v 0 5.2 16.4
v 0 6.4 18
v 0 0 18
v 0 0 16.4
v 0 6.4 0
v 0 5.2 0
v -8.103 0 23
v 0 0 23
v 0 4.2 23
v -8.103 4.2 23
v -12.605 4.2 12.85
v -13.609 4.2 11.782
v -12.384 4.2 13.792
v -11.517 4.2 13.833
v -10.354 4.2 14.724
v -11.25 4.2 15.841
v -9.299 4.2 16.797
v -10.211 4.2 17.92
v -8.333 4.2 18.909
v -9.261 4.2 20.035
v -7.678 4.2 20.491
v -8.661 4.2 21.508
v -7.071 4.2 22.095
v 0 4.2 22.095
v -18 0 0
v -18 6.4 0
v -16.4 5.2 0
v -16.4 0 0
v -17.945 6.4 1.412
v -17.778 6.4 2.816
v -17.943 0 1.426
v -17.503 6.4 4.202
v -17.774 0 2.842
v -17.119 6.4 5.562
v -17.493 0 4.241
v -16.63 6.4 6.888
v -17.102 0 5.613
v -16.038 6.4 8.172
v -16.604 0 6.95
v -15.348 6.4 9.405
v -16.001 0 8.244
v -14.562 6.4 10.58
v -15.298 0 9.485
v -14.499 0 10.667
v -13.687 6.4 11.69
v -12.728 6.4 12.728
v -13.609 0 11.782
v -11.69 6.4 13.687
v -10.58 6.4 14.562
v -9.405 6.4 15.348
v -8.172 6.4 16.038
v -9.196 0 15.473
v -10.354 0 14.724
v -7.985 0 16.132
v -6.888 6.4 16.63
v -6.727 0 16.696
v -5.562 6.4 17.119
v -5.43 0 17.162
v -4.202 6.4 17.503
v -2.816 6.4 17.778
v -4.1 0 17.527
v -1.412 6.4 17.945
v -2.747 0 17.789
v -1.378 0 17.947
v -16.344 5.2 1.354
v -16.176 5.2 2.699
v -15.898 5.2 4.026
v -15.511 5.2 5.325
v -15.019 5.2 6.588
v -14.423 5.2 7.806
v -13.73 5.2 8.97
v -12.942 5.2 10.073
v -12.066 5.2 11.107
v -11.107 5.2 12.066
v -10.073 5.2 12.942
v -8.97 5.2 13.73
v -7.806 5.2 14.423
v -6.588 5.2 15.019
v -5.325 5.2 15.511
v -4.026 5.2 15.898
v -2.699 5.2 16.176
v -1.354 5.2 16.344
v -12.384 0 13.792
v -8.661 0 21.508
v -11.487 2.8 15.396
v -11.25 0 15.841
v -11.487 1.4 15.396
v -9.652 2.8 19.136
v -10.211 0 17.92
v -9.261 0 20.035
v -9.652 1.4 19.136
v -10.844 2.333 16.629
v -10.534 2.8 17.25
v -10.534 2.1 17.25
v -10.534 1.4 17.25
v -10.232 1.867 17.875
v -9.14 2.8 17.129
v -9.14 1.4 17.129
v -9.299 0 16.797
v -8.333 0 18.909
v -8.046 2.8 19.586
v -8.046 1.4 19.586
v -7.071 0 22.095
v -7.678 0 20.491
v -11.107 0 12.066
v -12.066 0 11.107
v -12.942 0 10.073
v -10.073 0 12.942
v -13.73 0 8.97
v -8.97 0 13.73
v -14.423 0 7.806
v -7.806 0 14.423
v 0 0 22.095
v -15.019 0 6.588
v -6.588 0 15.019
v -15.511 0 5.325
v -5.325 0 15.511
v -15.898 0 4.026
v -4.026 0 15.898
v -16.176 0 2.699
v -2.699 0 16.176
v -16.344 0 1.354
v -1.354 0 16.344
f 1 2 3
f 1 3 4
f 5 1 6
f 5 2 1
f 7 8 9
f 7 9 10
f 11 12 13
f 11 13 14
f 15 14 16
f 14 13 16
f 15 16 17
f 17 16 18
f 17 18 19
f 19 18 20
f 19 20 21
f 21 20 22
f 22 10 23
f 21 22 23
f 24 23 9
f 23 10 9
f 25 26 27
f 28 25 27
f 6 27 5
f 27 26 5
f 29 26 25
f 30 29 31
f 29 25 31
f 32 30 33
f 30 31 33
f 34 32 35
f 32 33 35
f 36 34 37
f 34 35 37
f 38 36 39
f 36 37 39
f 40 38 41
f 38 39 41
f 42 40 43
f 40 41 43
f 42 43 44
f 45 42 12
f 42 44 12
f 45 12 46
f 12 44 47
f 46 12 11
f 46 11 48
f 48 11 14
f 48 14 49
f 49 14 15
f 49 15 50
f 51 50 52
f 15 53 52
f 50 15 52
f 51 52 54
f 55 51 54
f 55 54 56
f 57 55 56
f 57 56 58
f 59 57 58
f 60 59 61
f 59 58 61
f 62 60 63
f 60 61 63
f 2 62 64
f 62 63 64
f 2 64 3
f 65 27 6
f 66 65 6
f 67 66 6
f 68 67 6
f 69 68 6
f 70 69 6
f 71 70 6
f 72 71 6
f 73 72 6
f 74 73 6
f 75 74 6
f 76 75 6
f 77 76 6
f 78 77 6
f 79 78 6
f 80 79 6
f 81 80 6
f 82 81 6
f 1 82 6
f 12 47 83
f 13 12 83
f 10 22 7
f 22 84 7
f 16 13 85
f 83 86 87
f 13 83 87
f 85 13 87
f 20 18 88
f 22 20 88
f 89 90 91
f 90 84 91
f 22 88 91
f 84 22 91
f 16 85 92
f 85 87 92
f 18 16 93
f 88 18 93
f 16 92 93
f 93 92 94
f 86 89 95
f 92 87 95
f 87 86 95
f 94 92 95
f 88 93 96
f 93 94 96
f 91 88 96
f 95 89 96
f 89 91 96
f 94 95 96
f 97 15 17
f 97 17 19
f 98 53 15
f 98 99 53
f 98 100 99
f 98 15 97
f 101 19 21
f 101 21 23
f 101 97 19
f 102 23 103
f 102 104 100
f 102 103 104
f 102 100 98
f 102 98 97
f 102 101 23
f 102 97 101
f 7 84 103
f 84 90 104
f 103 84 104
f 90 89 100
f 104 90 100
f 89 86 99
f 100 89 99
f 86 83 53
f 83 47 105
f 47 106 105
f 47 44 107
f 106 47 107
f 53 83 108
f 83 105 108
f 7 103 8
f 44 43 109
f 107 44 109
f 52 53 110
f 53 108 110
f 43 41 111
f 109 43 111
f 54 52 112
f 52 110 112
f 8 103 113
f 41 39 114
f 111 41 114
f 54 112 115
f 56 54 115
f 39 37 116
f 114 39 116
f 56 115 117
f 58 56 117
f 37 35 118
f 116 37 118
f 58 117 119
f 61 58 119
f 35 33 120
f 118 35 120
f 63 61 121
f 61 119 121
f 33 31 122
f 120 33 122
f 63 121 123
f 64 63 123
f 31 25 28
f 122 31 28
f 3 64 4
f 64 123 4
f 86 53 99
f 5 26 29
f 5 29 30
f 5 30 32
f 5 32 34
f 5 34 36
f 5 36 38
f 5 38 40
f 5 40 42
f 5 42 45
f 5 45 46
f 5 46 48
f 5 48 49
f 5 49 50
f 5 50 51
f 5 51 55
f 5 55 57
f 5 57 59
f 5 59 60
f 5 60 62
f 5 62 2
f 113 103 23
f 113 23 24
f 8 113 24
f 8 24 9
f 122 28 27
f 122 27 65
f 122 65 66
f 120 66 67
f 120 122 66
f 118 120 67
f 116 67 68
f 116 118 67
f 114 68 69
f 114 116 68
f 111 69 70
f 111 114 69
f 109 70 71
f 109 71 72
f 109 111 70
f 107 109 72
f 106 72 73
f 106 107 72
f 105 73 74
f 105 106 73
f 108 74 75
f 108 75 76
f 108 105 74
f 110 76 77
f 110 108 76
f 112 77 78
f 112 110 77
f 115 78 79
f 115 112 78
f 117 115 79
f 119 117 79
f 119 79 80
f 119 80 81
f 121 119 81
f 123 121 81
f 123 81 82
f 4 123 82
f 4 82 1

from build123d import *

# Parameters (mm, degrees)
SKETCH1_R           = 18
SKETCH1_R_2         = 16.4
BOSS_EXTRUDE1_DEPTH = 6.4
SKETCH2_R           = 16.4
BOSS_EXTRUDE2_DEPTH = 1.2
SKETCH3_W           = 28.944907734
SKETCH3_H           = 19.372936664
SKETCH3_W_2         = 25.830582219
CUT_EXTRUDE1_DEPTH  = 9.2
SKETCH4_W           = 21.729498485
SKETCH4_H           = 20.961841185
CUT_EXTRUDE2_DEPTH  = 9.2
BOSS_EXTRUDE3_DEPTH = 4.2


with BuildPart() as part:
    # Sketch1 → Boss-Extrude1 (new body)
    with BuildSketch(Plane(origin=(0, 0, 0), x_dir=(1, 0, 0), z_dir=(0, 1, 0))):
        Circle(SKETCH1_R)
        Circle(SKETCH1_R_2, mode=Mode.SUBTRACT)
    extrude(amount=BOSS_EXTRUDE1_DEPTH)

    # Sketch2 → Boss-Extrude2 (add)
    with BuildSketch(Plane(origin=(0, 6.4, 0), x_dir=(1, 0, 0), z_dir=(0, 1, 0))):
        Circle(SKETCH2_R)
    extrude(amount=-BOSS_EXTRUDE2_DEPTH)

    # Sketch3 → Cut-Extrude1 (cut)
    with BuildSketch(Plane(origin=(0, 6.4, 0), x_dir=(1, 0, 0), z_dir=(0, 1, 0))):
        with Locations((-14.472453867, 9.686468332)):
            Rectangle(SKETCH3_W, SKETCH3_H)
        with Locations((12.91529111, 9.686468332)):
            Rectangle(SKETCH3_W_2, SKETCH3_H)
    extrude(amount=-CUT_EXTRUDE1_DEPTH, mode=Mode.SUBTRACT)

    # Sketch4 → Cut-Extrude2 (cut)
    with BuildSketch(Plane(origin=(0, 6.4, 0), x_dir=(1, 0, 0), z_dir=(0, 1, 0))):
        with Locations((10.864749243, -10.480920593)):
            Rectangle(SKETCH4_W, SKETCH4_H)
    extrude(amount=-CUT_EXTRUDE2_DEPTH, mode=Mode.SUBTRACT)

    # Sketch7 → Boss-Extrude3 (add)
    with BuildSketch(Plane.XZ):
        with BuildLine():
            Line((-7.071454056, 22.094943573), (0, 22.094943573))
            Line((0, 22.094943573), (0, 23))
            Line((0, 23), (-8.102673091, 23))
            add(Edge.make_bspline(
                [(-13.608541935, 11.781663143), (-11.344094103, 15.333566486), (-9.508804488, 19.073012106), (-8.102673091, 23)],
                knots=[0.222401663, 0.222401663, 0.222401663, 0.222401663, 0.927765661, 0.927765661, 0.927765661, 0.927765661], degree=3))
            ThreePointArc((-13.608541935, 11.781663143), (-12.071131769, 13.352444638), (-10.353735644, 14.724135228))
            add(Edge.make_bspline(
                [(-10.353735644, 14.724135228), (-9.080392431, 17.10273932), (-7.986298568, 19.559675436), (-7.071454056, 22.094943573)],
                knots=[0.464158141, 0.464158141, 0.464158141, 0.464158141, 0.920020117, 0.920020117, 0.920020117, 0.920020117], degree=3))
        make_face()
    extrude(amount=-BOSS_EXTRUDE3_DEPTH)


solid = part.part
